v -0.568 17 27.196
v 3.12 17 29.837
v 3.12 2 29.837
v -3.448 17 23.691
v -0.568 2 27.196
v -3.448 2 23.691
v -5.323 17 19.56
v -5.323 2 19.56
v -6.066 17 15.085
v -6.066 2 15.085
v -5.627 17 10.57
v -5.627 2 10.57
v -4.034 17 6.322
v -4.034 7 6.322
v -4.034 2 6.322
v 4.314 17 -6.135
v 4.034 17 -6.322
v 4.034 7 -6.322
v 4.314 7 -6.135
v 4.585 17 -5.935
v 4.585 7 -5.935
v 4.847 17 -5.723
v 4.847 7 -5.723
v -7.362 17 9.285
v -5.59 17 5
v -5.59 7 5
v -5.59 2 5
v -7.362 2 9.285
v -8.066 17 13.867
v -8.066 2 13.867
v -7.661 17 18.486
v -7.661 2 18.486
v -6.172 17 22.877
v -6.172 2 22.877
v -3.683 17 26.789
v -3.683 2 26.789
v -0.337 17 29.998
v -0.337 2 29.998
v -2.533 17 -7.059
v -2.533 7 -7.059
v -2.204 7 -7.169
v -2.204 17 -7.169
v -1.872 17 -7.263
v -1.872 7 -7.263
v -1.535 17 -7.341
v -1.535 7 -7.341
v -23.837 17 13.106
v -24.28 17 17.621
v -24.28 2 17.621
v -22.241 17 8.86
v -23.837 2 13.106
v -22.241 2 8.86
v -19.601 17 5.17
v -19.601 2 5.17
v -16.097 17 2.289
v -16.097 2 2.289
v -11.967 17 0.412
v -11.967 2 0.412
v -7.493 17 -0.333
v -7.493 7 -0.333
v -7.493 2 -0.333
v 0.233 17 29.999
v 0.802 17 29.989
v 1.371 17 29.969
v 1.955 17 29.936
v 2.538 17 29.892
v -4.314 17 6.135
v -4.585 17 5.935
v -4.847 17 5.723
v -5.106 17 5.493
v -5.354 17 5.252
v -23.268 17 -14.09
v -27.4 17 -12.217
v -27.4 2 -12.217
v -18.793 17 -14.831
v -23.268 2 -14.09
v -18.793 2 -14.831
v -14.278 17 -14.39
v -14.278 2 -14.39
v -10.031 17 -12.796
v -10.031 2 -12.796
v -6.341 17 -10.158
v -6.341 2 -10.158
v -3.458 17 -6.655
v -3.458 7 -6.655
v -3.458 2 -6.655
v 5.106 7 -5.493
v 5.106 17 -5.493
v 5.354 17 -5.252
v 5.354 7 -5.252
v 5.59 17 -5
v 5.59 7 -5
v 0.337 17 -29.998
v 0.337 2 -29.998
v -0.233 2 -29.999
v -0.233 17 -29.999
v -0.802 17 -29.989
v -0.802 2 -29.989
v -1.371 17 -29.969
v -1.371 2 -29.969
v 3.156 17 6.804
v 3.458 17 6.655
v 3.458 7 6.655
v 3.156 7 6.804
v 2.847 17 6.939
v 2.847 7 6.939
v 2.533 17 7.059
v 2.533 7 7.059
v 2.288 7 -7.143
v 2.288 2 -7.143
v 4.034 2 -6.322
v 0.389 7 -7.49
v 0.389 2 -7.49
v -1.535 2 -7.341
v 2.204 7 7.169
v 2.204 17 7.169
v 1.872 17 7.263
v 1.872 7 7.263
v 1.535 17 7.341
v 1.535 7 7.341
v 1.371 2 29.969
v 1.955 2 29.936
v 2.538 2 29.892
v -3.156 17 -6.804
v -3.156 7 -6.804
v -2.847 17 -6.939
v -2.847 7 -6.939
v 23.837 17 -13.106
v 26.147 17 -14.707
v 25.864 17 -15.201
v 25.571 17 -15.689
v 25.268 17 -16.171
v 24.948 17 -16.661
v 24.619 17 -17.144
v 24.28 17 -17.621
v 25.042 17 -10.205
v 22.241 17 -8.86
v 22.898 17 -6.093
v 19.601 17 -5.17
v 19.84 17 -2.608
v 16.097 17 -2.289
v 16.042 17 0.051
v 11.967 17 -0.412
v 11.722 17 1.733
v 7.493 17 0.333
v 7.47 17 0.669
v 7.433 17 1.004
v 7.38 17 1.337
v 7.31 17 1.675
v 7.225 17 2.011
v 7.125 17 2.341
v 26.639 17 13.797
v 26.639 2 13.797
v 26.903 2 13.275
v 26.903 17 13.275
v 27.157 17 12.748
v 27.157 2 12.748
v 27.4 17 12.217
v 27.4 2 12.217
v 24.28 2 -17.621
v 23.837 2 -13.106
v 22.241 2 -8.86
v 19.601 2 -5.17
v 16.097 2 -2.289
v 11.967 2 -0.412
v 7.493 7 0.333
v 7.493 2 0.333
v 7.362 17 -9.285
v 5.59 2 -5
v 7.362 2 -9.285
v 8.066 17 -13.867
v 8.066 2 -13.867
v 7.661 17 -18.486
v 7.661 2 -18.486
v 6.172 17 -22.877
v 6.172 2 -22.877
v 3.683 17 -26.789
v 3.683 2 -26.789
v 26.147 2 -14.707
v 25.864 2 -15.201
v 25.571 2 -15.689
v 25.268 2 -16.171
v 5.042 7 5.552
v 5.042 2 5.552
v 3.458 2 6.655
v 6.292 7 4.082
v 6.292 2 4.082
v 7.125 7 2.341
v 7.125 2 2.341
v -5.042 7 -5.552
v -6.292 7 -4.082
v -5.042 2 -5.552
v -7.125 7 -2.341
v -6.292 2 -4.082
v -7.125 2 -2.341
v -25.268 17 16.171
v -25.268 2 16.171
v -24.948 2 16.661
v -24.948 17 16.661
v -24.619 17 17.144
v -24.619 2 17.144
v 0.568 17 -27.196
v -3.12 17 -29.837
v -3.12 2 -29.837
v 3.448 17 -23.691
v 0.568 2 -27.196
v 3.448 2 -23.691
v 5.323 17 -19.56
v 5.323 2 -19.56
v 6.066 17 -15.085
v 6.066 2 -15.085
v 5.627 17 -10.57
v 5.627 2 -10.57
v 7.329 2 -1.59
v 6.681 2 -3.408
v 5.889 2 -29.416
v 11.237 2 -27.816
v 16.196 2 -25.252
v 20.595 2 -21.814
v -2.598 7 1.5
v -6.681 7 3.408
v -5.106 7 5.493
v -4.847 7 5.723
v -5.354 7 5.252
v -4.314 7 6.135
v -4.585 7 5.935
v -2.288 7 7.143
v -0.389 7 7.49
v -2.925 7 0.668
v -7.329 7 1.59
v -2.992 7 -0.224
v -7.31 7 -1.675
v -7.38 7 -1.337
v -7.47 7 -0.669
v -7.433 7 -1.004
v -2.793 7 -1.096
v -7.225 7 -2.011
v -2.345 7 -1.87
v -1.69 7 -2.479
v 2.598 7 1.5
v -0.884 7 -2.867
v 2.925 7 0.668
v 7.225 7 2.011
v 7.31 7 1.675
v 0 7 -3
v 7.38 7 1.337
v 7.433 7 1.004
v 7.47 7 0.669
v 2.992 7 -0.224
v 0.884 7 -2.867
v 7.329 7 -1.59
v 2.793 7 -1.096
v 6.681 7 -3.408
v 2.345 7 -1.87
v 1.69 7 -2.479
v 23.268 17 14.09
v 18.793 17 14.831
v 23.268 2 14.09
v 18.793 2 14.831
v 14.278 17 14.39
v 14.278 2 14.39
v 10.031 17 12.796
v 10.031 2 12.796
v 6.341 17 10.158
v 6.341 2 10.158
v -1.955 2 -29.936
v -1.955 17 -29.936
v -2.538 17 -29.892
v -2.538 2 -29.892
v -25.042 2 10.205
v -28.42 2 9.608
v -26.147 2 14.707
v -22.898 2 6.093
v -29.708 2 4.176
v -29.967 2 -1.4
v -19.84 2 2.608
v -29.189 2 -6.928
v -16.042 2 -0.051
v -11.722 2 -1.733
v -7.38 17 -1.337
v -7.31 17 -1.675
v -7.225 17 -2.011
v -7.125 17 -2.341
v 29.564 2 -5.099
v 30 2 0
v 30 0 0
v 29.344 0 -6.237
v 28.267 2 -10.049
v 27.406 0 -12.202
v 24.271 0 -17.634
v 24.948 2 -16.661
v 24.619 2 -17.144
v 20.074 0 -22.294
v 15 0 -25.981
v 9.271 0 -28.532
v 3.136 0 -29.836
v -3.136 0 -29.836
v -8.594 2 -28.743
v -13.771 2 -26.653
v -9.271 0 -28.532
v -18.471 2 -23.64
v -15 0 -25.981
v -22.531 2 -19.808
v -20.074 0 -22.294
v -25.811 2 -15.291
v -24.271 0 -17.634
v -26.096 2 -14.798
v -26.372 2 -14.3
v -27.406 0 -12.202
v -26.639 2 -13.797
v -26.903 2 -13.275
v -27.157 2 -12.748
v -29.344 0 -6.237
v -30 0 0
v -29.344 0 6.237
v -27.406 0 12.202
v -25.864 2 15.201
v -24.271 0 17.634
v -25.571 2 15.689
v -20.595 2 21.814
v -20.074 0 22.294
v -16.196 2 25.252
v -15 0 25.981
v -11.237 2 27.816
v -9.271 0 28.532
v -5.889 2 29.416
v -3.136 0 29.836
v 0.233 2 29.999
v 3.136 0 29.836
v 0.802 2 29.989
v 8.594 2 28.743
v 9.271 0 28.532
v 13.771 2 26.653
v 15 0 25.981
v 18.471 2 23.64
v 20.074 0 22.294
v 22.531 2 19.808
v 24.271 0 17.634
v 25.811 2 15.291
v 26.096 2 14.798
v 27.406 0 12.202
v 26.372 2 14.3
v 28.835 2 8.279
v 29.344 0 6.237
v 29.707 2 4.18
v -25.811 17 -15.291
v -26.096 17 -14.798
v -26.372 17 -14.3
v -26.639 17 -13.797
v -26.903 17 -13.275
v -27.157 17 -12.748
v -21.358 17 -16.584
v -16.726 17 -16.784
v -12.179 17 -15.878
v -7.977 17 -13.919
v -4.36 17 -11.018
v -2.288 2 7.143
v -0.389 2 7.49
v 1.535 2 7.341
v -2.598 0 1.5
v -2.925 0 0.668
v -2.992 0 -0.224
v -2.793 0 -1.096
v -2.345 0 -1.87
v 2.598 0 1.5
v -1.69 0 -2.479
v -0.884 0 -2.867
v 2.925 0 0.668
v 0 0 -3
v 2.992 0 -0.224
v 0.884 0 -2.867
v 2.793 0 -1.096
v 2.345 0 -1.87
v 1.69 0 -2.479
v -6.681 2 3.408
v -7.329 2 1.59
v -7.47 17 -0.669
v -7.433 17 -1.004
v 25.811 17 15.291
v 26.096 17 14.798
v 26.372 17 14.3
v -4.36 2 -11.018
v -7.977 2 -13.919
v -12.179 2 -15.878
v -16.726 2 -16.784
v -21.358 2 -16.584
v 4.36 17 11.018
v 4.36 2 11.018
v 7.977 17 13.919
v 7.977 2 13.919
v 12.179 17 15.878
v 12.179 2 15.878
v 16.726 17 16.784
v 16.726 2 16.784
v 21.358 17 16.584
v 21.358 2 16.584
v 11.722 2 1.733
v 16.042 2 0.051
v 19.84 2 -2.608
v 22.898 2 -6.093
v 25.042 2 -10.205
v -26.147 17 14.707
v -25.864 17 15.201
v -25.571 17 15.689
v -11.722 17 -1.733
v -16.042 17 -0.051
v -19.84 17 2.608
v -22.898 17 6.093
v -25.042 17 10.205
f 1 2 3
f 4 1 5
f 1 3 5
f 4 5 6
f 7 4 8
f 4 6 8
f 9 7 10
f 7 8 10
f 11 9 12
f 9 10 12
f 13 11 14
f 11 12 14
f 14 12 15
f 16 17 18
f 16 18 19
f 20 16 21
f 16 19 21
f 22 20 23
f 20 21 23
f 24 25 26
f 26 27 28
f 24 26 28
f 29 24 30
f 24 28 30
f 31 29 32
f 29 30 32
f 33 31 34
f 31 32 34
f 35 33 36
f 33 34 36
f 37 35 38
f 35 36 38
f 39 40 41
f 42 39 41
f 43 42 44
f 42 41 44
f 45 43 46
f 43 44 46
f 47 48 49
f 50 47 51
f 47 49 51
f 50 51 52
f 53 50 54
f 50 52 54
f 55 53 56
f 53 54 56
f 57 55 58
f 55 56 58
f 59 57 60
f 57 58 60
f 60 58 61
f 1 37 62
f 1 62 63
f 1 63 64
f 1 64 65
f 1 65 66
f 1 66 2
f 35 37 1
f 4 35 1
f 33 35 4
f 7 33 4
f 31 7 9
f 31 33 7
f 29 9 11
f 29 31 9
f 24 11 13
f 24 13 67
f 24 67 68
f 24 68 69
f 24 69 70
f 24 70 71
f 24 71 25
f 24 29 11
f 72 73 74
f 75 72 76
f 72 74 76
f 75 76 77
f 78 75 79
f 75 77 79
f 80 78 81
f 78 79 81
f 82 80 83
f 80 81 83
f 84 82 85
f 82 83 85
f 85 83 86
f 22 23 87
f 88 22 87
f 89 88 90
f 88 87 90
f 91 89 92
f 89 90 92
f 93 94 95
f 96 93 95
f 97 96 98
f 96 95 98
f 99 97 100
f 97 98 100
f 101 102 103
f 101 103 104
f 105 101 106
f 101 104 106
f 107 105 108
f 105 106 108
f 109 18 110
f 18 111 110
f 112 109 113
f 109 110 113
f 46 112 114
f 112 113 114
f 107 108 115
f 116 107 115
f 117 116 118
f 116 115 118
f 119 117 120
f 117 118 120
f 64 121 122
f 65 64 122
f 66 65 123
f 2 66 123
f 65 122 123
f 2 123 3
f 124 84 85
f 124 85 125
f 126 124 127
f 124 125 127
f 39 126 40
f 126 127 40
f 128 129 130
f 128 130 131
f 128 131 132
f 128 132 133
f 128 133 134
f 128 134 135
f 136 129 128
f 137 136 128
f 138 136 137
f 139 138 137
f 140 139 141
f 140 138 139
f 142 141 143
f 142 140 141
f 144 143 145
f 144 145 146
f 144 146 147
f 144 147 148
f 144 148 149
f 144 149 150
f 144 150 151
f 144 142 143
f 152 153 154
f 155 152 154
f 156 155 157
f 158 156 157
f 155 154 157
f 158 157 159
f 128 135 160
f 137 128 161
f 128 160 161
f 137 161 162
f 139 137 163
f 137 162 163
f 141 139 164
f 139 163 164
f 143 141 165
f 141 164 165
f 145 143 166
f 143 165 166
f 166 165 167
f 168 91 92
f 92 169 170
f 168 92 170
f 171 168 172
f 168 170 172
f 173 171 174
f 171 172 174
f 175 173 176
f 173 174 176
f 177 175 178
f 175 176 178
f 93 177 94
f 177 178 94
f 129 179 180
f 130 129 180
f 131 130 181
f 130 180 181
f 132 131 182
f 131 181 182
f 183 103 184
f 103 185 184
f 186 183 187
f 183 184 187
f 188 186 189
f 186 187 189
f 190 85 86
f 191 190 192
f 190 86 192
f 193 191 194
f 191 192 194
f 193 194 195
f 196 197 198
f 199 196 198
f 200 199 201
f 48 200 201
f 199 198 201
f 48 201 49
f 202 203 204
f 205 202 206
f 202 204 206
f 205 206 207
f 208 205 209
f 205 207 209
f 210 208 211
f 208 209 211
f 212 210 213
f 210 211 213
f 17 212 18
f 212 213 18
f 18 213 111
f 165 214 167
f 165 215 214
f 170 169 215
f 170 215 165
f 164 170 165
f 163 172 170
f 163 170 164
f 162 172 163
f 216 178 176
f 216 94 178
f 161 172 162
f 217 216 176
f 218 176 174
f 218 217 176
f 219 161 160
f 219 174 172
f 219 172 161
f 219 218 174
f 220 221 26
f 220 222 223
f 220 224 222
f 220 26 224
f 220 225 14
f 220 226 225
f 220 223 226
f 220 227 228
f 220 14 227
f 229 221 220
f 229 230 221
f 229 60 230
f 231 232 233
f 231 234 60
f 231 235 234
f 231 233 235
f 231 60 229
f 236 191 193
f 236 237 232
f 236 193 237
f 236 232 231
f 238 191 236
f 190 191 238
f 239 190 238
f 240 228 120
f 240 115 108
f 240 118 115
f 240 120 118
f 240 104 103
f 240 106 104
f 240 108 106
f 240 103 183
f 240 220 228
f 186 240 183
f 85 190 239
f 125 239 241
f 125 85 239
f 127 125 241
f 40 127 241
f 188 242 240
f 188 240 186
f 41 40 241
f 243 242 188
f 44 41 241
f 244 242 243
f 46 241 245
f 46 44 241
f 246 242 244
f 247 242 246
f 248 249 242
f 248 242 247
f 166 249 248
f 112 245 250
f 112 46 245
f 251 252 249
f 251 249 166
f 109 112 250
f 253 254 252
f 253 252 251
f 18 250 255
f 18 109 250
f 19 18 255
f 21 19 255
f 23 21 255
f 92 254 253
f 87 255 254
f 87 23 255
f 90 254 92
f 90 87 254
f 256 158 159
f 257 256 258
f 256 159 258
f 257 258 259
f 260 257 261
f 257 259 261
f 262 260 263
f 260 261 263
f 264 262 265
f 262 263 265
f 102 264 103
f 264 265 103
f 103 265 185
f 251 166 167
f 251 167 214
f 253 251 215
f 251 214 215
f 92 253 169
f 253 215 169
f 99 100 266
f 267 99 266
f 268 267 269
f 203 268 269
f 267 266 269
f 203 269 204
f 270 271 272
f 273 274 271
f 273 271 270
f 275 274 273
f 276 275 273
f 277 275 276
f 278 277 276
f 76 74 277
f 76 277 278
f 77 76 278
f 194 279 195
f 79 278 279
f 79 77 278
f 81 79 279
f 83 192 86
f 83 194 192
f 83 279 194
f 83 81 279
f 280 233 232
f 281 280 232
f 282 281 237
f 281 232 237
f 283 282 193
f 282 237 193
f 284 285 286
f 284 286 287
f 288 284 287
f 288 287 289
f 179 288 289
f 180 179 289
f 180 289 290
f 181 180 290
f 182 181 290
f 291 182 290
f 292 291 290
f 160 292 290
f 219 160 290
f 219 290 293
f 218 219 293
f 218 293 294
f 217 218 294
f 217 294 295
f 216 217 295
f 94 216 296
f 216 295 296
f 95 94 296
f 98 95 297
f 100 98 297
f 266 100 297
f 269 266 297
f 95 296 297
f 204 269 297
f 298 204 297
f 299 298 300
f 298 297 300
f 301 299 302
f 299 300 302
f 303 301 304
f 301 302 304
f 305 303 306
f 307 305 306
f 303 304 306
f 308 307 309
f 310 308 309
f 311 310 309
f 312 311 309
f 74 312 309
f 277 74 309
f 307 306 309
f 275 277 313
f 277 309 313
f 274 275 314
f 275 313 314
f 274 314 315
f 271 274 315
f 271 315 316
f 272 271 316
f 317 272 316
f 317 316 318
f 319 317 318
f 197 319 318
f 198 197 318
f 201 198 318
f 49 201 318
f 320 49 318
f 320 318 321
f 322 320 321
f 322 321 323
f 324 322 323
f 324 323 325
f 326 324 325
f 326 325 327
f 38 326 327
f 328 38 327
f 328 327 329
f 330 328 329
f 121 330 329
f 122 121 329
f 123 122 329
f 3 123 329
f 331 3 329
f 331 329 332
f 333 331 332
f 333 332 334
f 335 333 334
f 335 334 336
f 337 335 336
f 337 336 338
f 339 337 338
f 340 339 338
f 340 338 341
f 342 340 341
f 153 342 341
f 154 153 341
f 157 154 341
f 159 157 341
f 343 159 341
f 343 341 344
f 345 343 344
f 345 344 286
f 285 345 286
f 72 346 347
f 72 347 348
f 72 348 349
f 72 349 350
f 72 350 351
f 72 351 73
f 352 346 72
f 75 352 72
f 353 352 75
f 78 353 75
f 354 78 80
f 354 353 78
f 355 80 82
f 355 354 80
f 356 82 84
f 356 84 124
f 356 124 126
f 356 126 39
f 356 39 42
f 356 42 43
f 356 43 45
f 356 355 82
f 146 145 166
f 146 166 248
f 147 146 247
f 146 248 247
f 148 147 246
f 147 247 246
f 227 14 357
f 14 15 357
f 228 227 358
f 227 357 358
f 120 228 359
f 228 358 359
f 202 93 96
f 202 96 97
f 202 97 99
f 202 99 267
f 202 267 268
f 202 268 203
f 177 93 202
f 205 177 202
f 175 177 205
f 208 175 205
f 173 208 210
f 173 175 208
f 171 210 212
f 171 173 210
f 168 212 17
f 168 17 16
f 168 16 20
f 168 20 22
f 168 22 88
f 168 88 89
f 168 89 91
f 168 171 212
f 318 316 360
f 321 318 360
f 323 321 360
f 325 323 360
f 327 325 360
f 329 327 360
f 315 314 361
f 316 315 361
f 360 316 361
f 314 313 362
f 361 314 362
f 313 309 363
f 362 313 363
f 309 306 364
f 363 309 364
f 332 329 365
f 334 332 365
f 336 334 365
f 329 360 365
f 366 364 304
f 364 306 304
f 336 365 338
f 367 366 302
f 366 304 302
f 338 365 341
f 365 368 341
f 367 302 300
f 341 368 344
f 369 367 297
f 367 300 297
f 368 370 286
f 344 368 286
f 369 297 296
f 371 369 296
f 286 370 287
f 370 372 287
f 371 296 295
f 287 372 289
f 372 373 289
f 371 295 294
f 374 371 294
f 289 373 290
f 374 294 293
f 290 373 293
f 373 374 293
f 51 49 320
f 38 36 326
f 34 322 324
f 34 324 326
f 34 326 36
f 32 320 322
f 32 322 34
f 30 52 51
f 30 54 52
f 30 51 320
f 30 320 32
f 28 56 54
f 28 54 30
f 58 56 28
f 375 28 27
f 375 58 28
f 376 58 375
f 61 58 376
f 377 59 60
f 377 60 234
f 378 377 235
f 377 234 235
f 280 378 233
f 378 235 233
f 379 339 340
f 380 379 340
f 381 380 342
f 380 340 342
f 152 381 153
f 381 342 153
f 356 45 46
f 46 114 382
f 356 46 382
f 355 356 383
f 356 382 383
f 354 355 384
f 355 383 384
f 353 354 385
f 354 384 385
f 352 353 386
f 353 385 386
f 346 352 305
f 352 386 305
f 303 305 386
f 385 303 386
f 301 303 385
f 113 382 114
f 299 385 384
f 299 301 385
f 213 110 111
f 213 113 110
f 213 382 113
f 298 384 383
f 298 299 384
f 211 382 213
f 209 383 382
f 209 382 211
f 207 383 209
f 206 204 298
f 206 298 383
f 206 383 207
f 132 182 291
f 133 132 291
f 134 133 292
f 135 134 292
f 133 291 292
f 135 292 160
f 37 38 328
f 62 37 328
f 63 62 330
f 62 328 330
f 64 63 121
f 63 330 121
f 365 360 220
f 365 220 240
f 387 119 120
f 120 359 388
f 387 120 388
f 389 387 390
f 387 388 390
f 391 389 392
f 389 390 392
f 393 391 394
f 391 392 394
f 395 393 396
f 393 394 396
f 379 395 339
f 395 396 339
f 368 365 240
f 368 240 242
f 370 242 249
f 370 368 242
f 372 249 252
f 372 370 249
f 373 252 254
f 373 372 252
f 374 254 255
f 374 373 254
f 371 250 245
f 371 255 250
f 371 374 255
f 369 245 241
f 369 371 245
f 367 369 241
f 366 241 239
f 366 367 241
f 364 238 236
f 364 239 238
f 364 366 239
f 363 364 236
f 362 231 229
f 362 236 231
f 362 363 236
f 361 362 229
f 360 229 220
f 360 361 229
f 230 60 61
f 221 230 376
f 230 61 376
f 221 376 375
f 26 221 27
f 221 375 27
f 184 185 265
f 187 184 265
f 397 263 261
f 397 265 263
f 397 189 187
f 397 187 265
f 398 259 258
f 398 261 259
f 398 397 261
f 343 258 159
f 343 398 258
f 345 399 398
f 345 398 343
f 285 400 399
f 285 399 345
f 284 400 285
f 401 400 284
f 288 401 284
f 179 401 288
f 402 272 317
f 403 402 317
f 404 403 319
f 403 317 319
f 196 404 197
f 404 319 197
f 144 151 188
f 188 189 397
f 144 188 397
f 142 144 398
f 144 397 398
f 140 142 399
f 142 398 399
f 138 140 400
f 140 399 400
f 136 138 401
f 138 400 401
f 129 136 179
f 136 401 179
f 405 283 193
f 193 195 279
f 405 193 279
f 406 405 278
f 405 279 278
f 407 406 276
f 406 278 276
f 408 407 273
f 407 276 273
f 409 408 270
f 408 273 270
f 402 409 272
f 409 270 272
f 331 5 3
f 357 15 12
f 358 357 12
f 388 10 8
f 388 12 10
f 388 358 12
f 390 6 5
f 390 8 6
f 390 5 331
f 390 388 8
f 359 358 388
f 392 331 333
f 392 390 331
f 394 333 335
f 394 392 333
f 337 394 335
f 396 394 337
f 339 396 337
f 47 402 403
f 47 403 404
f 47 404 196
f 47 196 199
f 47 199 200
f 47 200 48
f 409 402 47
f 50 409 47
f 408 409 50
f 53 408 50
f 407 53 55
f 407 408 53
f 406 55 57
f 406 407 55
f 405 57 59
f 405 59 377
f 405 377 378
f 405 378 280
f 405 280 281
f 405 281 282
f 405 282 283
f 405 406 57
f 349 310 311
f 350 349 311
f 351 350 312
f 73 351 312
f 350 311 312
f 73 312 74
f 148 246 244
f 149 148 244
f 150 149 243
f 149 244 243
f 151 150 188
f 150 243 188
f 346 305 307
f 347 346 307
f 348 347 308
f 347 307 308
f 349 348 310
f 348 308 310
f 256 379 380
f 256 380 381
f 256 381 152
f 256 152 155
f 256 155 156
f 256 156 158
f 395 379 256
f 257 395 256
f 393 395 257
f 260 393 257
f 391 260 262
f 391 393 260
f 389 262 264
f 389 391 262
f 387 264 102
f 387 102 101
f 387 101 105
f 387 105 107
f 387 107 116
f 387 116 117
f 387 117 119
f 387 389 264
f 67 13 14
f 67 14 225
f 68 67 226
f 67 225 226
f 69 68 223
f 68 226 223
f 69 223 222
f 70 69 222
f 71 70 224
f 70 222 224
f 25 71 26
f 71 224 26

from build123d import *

# Parameters (mm, degrees)
SKETCH1_R           = 30
BOSS_EXTRUDE1_DEPTH = 2
SKETCH2_R           = 7.5
BOSS_EXTRUDE2_DEPTH = 7
BOSS_EXTRUDE3_DEPTH = 15
CUT_EXTRUDE1_DEPTH  = 18
CIRPATTERN2_COUNT   = 6


with BuildPart() as part:
    # Sketch1 → Boss-Extrude1 (new body)
    with BuildSketch(Plane(origin=(0, 0, 0), x_dir=(1, 0, 0), z_dir=(0, 1, 0))):
        Circle(SKETCH1_R)
    extrude(amount=BOSS_EXTRUDE1_DEPTH)

    # Sketch2 → Boss-Extrude2 (add)
    with BuildSketch(Plane(origin=(0, 0, 0), x_dir=(1, 0, 0), z_dir=(0, 1, 0))):
        Circle(SKETCH2_R)
    extrude(amount=BOSS_EXTRUDE2_DEPTH)

    # Sketch3 → Boss-Extrude3 (add)
    with BuildSketch(Plane(origin=(0, 2, 0), x_dir=(1, 0, 0), z_dir=(0, 1, 0))):
        with BuildLine():
            ThreePointArc((-27.399897799, 12.216611666), (-14.278250642, 14.389995002), (-3.458222056, 6.65512586))
            ThreePointArc((-3.458222056, 6.65512586), (-3.002192418, 6.872906277), (-2.532531954, 7.059481702))
            ThreePointArc((-2.532531954, 7.059481702), (-13.262608044, 15.162164286), (-26.638909527, 13.797409149))
            ThreePointArc((-26.638909527, 13.797409149), (-27.03096196, 13.012574516), (-27.399897799, 12.216611666))
        make_face()
        with BuildLine():
            ThreePointArc((-2.532531954, 7.059481702), (-2.038530942, 7.217644463), (-1.534779322, 7.341284113))
            ThreePointArc((-1.534779322, 7.341284113), (-12.178839524, 15.878170307), (-25.810761164, 15.290670625))
            ThreePointArc((-25.810761164, 15.290670625), (-26.235461619, 14.549933115), (-26.638909527, 13.797409149))
            ThreePointArc((-26.638909527, 13.797409149), (-13.262608044, 15.162164286), (-2.532531954, 7.059481702))
        make_face()
    boss_extrude3 = extrude(amount=BOSS_EXTRUDE3_DEPTH)

    # Sketch4 → Cut-Extrude1 (cut, through all)
    with BuildSketch(Plane(origin=(0, 0, 0), x_dir=(1, 0, 0), z_dir=(0, 1, 0))):
        with BuildLine():
            Line((-2.598076211, -1.5), (2.598076211, -1.5))
            ThreePointArc((2.598076211, -1.5), (0, 3), (-2.598076211, -1.5))
        make_face()
    extrude(amount=CUT_EXTRUDE1_DEPTH, mode=Mode.SUBTRACT)

    # CirPattern2: Boss-Extrude3 ×6 about axis
    cirpattern2_axis = Axis((0, 0, 0), (0, 1, 0))
    for i in range(1, CIRPATTERN2_COUNT):
        add(boss_extrude3.rotate(cirpattern2_axis, i * 360 / CIRPATTERN2_COUNT))


solid = part.part
